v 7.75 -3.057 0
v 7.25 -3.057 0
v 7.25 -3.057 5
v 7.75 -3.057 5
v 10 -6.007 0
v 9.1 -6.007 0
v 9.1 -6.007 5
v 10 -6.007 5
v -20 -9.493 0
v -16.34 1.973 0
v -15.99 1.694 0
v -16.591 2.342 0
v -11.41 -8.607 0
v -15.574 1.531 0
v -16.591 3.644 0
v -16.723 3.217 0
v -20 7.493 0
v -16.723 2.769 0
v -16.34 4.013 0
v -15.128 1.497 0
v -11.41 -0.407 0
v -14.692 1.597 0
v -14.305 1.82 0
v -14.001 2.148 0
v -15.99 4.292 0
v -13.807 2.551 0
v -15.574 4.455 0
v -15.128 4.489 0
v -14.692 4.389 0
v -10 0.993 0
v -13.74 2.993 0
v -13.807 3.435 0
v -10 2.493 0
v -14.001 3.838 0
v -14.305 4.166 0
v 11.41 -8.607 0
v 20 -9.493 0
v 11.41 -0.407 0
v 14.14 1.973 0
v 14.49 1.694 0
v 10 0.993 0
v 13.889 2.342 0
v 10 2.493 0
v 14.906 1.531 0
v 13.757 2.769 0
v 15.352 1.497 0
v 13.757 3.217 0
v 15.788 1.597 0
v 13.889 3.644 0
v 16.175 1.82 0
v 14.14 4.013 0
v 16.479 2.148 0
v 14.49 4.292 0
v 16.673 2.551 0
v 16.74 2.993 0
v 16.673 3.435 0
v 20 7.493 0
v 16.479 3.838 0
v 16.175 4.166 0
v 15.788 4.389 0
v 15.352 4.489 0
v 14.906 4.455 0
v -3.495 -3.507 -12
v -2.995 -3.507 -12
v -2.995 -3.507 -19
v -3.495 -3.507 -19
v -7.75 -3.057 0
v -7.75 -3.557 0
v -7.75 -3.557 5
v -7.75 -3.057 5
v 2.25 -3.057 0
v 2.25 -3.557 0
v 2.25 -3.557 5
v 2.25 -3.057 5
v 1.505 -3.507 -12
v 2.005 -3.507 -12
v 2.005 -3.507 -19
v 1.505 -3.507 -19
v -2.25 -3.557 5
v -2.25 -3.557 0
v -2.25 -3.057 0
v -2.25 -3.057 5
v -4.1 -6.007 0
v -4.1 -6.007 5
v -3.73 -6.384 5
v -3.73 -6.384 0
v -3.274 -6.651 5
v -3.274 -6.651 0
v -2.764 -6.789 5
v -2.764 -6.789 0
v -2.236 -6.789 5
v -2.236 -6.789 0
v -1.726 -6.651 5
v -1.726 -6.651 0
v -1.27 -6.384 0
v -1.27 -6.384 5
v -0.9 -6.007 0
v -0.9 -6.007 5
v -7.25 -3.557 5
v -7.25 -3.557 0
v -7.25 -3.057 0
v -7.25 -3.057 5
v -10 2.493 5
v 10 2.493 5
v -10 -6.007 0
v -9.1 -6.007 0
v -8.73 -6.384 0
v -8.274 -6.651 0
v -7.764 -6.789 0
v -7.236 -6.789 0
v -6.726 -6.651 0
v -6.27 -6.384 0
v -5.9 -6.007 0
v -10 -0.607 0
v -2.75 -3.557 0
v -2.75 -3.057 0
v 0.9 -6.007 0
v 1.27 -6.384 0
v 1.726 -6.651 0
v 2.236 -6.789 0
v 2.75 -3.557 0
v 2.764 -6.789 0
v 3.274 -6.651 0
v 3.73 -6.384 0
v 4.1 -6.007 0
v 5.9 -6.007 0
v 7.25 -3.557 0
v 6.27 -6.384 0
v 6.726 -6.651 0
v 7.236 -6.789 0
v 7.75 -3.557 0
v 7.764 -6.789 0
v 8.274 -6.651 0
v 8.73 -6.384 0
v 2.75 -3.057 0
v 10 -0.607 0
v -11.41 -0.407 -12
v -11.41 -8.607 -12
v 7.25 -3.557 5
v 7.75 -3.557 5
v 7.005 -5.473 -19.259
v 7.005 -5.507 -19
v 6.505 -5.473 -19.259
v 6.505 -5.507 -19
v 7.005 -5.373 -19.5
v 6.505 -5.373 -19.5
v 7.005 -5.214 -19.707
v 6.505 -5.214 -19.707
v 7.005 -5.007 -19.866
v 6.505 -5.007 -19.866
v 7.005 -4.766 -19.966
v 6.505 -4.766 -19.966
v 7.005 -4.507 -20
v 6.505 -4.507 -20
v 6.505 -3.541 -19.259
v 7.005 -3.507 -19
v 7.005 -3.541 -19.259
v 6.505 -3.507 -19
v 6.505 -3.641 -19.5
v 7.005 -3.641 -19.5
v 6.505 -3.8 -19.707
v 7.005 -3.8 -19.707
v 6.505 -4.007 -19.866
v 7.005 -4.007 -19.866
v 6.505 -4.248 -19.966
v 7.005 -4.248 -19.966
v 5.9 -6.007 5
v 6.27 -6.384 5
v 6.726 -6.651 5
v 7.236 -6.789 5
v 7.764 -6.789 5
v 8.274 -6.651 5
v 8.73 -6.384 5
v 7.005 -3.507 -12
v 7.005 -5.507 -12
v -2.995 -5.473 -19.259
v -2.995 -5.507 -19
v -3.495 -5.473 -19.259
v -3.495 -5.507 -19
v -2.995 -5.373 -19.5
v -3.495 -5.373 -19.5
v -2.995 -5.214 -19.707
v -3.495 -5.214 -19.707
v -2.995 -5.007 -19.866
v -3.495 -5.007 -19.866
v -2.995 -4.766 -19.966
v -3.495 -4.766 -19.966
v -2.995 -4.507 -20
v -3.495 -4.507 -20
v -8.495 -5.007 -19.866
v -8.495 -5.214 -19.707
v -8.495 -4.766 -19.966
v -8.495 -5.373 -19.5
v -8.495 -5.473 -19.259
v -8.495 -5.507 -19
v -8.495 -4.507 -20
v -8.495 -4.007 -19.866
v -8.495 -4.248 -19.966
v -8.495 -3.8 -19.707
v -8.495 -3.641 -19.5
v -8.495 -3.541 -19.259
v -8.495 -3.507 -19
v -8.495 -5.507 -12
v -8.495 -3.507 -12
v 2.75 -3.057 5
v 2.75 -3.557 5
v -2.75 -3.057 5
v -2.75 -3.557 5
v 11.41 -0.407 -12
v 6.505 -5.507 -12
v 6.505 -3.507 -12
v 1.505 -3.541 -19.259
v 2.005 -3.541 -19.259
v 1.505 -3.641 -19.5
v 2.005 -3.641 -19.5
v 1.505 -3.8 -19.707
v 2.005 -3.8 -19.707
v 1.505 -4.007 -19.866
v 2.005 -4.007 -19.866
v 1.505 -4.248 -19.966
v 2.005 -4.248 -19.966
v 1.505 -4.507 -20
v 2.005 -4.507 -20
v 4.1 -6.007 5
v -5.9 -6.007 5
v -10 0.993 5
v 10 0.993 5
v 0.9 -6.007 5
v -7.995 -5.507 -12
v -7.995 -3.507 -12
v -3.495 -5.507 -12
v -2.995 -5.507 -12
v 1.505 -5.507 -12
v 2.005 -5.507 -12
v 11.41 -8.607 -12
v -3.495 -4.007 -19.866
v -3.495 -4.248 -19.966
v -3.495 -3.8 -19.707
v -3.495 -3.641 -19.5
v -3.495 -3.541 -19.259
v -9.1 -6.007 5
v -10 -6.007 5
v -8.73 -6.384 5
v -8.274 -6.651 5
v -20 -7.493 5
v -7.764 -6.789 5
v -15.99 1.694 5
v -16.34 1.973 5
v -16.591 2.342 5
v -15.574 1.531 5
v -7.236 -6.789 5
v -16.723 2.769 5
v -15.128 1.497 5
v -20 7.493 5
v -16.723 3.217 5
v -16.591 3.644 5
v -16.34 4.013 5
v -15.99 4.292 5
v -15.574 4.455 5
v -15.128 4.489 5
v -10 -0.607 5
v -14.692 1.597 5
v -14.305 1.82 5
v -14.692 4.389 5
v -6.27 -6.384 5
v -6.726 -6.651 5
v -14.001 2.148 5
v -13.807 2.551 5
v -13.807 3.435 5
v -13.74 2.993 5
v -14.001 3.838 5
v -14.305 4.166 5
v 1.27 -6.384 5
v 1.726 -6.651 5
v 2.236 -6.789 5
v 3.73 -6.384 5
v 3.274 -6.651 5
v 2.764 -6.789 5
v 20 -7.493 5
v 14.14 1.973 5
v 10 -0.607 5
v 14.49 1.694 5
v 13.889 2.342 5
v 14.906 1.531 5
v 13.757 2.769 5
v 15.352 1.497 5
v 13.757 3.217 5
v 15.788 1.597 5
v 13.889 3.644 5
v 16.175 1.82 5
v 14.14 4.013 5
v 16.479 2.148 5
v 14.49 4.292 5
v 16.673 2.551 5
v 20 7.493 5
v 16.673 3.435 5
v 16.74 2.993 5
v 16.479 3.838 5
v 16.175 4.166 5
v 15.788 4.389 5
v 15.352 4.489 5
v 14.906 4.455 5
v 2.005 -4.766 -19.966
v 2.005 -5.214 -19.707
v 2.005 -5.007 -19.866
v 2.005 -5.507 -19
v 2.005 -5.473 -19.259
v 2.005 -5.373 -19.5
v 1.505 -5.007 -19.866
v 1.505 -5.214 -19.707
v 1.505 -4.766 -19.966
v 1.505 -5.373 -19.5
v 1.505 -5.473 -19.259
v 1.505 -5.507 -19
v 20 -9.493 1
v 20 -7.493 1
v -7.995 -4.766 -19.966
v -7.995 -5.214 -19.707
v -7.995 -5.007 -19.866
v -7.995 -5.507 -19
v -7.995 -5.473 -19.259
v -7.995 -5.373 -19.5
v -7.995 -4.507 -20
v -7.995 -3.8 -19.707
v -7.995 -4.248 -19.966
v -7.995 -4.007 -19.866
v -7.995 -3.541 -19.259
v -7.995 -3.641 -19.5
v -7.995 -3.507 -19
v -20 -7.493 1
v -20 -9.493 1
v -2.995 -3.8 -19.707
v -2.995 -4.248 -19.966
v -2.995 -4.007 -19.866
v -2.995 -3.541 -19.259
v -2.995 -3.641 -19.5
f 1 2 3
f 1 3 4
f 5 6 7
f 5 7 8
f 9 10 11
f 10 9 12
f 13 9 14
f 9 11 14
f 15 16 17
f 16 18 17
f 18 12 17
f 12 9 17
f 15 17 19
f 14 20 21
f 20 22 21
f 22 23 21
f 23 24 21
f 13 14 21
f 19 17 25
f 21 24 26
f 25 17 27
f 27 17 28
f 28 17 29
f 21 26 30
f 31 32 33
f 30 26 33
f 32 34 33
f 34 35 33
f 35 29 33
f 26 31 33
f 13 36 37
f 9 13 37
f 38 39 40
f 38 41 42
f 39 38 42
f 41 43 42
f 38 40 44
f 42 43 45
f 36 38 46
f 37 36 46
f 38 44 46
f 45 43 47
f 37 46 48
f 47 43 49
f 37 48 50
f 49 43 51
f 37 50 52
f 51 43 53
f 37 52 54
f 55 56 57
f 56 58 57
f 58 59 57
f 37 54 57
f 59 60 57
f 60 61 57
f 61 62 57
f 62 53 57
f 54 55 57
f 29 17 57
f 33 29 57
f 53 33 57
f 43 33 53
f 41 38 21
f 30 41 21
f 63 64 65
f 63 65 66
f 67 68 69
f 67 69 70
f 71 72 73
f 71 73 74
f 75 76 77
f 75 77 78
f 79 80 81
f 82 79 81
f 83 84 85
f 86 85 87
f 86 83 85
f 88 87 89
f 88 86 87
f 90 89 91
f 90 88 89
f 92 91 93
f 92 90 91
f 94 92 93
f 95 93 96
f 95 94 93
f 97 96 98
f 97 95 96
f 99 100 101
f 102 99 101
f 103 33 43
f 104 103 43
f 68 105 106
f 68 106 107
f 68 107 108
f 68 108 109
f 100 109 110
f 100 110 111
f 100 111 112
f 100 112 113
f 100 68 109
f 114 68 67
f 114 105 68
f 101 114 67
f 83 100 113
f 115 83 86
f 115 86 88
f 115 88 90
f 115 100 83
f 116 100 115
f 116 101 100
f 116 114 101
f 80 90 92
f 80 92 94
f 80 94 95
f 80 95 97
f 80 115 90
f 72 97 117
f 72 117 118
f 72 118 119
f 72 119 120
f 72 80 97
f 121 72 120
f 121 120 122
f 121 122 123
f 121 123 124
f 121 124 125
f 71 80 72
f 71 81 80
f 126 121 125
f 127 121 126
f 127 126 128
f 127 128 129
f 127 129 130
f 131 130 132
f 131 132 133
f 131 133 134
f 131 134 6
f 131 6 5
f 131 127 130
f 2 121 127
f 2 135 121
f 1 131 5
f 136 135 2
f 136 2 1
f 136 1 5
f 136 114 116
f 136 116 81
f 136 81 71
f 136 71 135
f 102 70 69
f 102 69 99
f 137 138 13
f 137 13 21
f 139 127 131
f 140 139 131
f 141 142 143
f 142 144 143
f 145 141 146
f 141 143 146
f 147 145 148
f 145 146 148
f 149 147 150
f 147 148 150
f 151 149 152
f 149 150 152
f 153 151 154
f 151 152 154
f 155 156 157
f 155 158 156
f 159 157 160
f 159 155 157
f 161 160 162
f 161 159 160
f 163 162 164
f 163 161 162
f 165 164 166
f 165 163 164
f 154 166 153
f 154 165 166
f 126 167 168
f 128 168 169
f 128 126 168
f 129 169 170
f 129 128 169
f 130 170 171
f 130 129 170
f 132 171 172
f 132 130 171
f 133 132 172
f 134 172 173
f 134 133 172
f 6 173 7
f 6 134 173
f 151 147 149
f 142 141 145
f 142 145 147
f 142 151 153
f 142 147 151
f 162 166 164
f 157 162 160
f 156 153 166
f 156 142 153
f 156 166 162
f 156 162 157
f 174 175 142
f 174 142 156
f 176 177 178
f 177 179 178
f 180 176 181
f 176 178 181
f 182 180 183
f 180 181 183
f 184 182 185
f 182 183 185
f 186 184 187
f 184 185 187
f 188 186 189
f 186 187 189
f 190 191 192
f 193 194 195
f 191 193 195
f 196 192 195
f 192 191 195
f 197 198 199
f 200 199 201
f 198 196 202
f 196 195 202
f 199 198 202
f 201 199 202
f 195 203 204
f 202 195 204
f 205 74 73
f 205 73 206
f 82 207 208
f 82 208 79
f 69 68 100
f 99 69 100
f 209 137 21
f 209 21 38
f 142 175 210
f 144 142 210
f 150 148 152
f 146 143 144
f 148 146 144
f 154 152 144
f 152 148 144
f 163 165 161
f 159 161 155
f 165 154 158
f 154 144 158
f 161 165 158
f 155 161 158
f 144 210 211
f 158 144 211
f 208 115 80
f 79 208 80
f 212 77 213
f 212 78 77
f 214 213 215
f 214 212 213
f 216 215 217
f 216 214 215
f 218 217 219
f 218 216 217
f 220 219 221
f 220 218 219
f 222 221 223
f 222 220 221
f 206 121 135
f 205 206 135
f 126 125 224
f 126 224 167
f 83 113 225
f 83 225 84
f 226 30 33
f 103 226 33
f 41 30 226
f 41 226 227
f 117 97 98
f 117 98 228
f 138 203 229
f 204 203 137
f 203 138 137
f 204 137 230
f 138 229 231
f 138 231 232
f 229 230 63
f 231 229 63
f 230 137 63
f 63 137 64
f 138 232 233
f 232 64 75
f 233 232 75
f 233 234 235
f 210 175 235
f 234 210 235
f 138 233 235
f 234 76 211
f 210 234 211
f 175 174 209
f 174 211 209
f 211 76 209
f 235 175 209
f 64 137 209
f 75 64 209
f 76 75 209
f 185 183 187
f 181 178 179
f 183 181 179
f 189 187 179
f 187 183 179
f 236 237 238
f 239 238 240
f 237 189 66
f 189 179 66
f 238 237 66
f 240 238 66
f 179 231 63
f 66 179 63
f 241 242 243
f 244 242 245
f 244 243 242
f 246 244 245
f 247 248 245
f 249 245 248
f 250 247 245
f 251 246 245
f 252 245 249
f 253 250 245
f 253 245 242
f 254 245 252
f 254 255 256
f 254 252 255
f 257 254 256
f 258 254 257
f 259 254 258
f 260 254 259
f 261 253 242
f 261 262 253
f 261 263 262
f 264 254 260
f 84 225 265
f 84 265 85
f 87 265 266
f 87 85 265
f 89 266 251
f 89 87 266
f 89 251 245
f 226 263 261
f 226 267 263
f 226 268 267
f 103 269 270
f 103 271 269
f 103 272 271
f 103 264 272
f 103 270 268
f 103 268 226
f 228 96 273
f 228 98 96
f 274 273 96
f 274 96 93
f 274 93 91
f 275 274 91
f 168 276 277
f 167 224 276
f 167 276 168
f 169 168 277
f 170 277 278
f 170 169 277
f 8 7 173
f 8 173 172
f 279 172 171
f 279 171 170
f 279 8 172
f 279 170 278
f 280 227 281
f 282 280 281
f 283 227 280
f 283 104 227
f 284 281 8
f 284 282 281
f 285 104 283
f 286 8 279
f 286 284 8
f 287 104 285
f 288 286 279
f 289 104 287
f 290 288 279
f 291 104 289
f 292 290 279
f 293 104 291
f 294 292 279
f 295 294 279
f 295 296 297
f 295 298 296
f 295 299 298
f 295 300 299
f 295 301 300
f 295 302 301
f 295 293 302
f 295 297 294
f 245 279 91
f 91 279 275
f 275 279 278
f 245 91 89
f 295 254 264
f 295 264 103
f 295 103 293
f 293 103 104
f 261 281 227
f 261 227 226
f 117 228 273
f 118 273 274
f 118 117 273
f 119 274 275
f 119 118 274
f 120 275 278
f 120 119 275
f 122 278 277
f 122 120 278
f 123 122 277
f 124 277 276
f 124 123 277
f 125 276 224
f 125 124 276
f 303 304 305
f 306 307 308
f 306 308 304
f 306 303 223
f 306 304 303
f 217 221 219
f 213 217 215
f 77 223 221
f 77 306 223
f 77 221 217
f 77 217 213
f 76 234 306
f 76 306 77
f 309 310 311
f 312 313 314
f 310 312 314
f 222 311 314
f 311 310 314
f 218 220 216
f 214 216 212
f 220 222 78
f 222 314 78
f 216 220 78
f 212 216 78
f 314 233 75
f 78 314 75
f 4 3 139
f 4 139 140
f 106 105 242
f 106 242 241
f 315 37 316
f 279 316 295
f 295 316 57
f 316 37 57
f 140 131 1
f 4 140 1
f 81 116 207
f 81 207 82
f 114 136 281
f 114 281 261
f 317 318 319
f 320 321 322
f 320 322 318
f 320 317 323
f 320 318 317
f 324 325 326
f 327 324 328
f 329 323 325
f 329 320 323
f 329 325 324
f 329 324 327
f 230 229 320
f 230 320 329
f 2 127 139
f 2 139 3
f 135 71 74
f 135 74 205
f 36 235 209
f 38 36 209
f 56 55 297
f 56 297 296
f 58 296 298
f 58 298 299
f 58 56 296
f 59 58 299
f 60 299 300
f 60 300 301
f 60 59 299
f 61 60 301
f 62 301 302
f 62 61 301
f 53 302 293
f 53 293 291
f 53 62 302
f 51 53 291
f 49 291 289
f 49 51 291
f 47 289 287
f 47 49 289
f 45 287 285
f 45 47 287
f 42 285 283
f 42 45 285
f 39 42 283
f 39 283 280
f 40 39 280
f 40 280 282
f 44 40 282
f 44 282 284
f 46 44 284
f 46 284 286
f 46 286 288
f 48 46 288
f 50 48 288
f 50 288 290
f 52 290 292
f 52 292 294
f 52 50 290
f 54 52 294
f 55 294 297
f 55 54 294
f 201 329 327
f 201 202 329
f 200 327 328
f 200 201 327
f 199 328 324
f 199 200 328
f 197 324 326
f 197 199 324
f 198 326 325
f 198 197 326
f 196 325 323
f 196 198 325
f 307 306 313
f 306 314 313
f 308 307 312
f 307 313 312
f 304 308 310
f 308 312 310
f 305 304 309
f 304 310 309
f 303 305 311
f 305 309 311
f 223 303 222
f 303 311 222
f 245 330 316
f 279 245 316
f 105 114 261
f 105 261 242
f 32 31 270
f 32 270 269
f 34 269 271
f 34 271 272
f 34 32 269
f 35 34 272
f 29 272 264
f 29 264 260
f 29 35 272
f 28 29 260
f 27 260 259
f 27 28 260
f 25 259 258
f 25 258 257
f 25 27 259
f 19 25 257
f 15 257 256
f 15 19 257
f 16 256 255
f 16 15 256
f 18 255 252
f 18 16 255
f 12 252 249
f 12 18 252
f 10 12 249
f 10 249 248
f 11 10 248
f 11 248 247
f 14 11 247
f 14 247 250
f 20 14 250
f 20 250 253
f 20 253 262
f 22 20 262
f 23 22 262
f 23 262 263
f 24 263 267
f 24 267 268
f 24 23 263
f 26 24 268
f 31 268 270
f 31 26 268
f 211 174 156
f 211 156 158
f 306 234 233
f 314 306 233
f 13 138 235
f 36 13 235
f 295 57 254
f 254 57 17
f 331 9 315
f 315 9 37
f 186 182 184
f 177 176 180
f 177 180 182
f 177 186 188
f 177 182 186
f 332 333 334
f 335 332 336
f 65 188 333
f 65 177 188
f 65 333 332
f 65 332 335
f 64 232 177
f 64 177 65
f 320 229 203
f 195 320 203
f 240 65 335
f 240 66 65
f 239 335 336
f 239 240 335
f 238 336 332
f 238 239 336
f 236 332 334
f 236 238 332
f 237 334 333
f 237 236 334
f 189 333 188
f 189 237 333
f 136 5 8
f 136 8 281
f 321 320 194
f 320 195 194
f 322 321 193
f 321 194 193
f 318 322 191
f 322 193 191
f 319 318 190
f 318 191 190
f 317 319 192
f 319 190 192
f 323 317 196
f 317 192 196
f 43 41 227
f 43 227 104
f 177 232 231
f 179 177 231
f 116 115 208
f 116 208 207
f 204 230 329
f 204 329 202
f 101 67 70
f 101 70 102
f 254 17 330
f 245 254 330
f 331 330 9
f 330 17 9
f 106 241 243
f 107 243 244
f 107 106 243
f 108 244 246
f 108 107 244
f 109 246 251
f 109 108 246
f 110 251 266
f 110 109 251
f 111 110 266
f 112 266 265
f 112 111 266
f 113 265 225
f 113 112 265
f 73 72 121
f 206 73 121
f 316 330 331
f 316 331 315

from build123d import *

# Parameters (mm, degrees)
SKETCH1_R              = 1.5
SKETCH1_W              = 20
SKETCH1_H              = 1.5
SKETCH1_W_2            = 22.82
SKETCH1_H_2            = 7.086
BOSS_EXTRUDE1_DEPTH    = 5
SKETCH1_3_W            = 22.82
SKETCH1_3_H            = 1.114
BOSS_EXTRUDE2_DEPTH    = 1
CUT_EXTRUDE1_DEPTH     = 23.696190187
LPATTERN1_COUNT        = 4
LPATTERN1_PITCH        = 5
BOSS_EXTRUDE3_START    = -12
SKETCH1_5_W            = 22.82
SKETCH1_5_H            = 7.086
SKETCH1_5_H_2          = 1.114
BOSS_EXTRUDE3_DEPTH    = 12
SKETCH4_W              = 0.5
SKETCH4_H              = 0.5
BOSS_EXTRUDE4_DEPTH    = 5
SKETCH5_W              = 0.5
SKETCH5_H              = 2
BOSS_EXTRUDE5_DEPTH    = 8
FILLET1_R              = 1
LPATTERN2_COUNT        = 4
LPATTERN2_PITCH        = 5
FILLET1_OF_LPATTERN2_R = 1


with BuildPart() as part:
    # Sketch1 → Boss-Extrude1 (new body)
    # profile 1 of 3: a face of its own
    with BuildSketch(Plane.XY):
        Polygon((20, 7.493), (-20, 7.493), (-20, -7.493), (-11.41, -7.493), (-11.41, -0.407), (11.41, -0.407), (11.41, -7.493), (20, -7.493), align=None)
        with Locations((-15.24, 2.993)):
            Circle(SKETCH1_R, mode=Mode.SUBTRACT)
        with Locations((0, 1.743)):
            Rectangle(SKETCH1_W, SKETCH1_H, mode=Mode.SUBTRACT)
        with Locations((15.24, 2.993)):
            Circle(SKETCH1_R, mode=Mode.SUBTRACT)
    # profile 2 of 3: a face of its own
    with BuildSketch(Plane.XY):
        with Locations((0, -3.95)):
            Rectangle(SKETCH1_W_2, SKETCH1_H_2)
        with BuildLine():
            Line((-10, -0.607), (-5, -0.607))
            Line((-5, -0.607), (-5, -6.007))
            Line((-5, -6.007), (-5.9, -6.007))
            ThreePointArc((-5.9, -6.007), (-7.5, -6.807), (-9.1, -6.007))
            Line((-9.1, -6.007), (-10, -6.007))
            Line((-10, -6.007), (-10, -0.607))
        make_face(mode=Mode.SUBTRACT)
    # profile 3 of 3: a face of its own
    with BuildSketch(Plane.XY):
        with BuildLine():
            Line((-10, -6.007), (-9.1, -6.007))
            ThreePointArc((-9.1, -6.007), (-7.5, -6.807), (-5.9, -6.007))
            Line((-5.9, -6.007), (-5, -6.007))
            Line((-5, -6.007), (-5, -0.607))
            Line((-5, -0.607), (-10, -0.607))
            Line((-10, -0.607), (-10, -6.007))
        make_face()
    extrude(amount=BOSS_EXTRUDE1_DEPTH)

    # Sketch1<3> → Boss-Extrude2 (add)
    with BuildSketch(Plane.XY):
        Polygon((-11.41, -7.493), (-20, -7.493), (-20, -9.493), (20, -9.493), (20, -7.493), (11.41, -7.493), (11.41, -8.607), (-11.41, -8.607), align=None)
        with Locations((0, -8.05)):
            Rectangle(SKETCH1_3_W, SKETCH1_3_H)
    extrude(amount=BOSS_EXTRUDE2_DEPTH)

    # Sketch1<4> → Cut-Extrude1 (cut, through all)
    with BuildSketch(Plane.XY):
        with BuildLine():
            Line((-10, -6.007), (-9.1, -6.007))
            ThreePointArc((-9.1, -6.007), (-7.5, -6.807), (-5.9, -6.007))
            Line((-5.9, -6.007), (-5, -6.007))
            Line((-5, -6.007), (-5, -0.607))
            Line((-5, -0.607), (-10, -0.607))
            Line((-10, -0.607), (-10, -6.007))
        make_face()
    cut_extrude1 = extrude(amount=CUT_EXTRUDE1_DEPTH, mode=Mode.SUBTRACT)

    # LPattern1: Cut-Extrude1 ×4
    with Locations(*[(i * LPATTERN1_PITCH, 0, 0) for i in range(1, LPATTERN1_COUNT)]):
        add(cut_extrude1, mode=Mode.SUBTRACT)

    # Sketch1<5> → Boss-Extrude3 (add)
    # profile 1 of 3: a face of its own
    with BuildSketch(Plane.XY.offset(BOSS_EXTRUDE3_START)):
        with Locations((0, -3.95)):
            Rectangle(SKETCH1_5_W, SKETCH1_5_H)
        with BuildLine():
            Line((-10, -0.607), (-5, -0.607))
            Line((-5, -0.607), (-5, -6.007))
            Line((-5, -6.007), (-5.9, -6.007))
            ThreePointArc((-5.9, -6.007), (-7.5, -6.807), (-9.1, -6.007))
            Line((-9.1, -6.007), (-10, -6.007))
            Line((-10, -6.007), (-10, -0.607))
        make_face(mode=Mode.SUBTRACT)
    # profile 2 of 3: a face of its own
    with BuildSketch(Plane.XY.offset(BOSS_EXTRUDE3_START)):
        with BuildLine():
            Line((-10, -6.007), (-9.1, -6.007))
            ThreePointArc((-9.1, -6.007), (-7.5, -6.807), (-5.9, -6.007))
            Line((-5.9, -6.007), (-5, -6.007))
            Line((-5, -6.007), (-5, -0.607))
            Line((-5, -0.607), (-10, -0.607))
            Line((-10, -0.607), (-10, -6.007))
        make_face()
    # profile 3 of 3: a face of its own
    with BuildSketch(Plane.XY.offset(BOSS_EXTRUDE3_START)):
        with Locations((0, -8.05)):
            Rectangle(SKETCH1_5_W, SKETCH1_5_H_2)
    extrude(amount=BOSS_EXTRUDE3_DEPTH)

    # Sketch4 → Boss-Extrude4 (add)
    with BuildSketch(Plane.XY):
        with Locations((-7.5, -3.307)):
            Rectangle(SKETCH4_W, SKETCH4_H)
    boss_extrude4 = extrude(amount=BOSS_EXTRUDE4_DEPTH)

    # Sketch5 → Boss-Extrude5 (add)
    with BuildSketch(Plane(origin=(0, 0, -12), x_dir=(-1, 0, 0), z_dir=(0, 0, -1))):
        with Locations((8.245, -4.507)):
            Rectangle(SKETCH5_W, SKETCH5_H)
    boss_extrude5 = extrude(amount=BOSS_EXTRUDE5_DEPTH)

    # Fillet1
    fillet1_edges = [part.edges().sort_by_distance(p)[0] for p in [
        (-8.245, -5.507, -20),
        (-8.245, -3.507, -20),
    ]]
    fillet(fillet1_edges, radius=FILLET1_R - 0.0001)  # a hair under: the kernel refuses the full size

    # LPattern2: Boss-Extrude4, Boss-Extrude5 ×4
    with Locations(*[(i * LPATTERN2_PITCH, 0, 0) for i in range(1, LPATTERN2_COUNT)]):
        add(boss_extrude4)
        add(boss_extrude5)

    # Fillet1 of LPattern2
    fillet1_of_lpattern2_edges = [part.edges().sort_by_distance(p)[0] for p in [
        (-3.245, -5.507, -20),
        (-3.245, -3.507, -20),
        (1.755, -5.507, -20),
        (1.755, -3.507, -20),
        (6.755, -5.507, -20),
        (6.755, -3.507, -20),
    ]]
    fillet(fillet1_of_lpattern2_edges, radius=FILLET1_OF_LPATTERN2_R - 0.0001)  # a hair under: the kernel refuses the full size


solid = part.part
